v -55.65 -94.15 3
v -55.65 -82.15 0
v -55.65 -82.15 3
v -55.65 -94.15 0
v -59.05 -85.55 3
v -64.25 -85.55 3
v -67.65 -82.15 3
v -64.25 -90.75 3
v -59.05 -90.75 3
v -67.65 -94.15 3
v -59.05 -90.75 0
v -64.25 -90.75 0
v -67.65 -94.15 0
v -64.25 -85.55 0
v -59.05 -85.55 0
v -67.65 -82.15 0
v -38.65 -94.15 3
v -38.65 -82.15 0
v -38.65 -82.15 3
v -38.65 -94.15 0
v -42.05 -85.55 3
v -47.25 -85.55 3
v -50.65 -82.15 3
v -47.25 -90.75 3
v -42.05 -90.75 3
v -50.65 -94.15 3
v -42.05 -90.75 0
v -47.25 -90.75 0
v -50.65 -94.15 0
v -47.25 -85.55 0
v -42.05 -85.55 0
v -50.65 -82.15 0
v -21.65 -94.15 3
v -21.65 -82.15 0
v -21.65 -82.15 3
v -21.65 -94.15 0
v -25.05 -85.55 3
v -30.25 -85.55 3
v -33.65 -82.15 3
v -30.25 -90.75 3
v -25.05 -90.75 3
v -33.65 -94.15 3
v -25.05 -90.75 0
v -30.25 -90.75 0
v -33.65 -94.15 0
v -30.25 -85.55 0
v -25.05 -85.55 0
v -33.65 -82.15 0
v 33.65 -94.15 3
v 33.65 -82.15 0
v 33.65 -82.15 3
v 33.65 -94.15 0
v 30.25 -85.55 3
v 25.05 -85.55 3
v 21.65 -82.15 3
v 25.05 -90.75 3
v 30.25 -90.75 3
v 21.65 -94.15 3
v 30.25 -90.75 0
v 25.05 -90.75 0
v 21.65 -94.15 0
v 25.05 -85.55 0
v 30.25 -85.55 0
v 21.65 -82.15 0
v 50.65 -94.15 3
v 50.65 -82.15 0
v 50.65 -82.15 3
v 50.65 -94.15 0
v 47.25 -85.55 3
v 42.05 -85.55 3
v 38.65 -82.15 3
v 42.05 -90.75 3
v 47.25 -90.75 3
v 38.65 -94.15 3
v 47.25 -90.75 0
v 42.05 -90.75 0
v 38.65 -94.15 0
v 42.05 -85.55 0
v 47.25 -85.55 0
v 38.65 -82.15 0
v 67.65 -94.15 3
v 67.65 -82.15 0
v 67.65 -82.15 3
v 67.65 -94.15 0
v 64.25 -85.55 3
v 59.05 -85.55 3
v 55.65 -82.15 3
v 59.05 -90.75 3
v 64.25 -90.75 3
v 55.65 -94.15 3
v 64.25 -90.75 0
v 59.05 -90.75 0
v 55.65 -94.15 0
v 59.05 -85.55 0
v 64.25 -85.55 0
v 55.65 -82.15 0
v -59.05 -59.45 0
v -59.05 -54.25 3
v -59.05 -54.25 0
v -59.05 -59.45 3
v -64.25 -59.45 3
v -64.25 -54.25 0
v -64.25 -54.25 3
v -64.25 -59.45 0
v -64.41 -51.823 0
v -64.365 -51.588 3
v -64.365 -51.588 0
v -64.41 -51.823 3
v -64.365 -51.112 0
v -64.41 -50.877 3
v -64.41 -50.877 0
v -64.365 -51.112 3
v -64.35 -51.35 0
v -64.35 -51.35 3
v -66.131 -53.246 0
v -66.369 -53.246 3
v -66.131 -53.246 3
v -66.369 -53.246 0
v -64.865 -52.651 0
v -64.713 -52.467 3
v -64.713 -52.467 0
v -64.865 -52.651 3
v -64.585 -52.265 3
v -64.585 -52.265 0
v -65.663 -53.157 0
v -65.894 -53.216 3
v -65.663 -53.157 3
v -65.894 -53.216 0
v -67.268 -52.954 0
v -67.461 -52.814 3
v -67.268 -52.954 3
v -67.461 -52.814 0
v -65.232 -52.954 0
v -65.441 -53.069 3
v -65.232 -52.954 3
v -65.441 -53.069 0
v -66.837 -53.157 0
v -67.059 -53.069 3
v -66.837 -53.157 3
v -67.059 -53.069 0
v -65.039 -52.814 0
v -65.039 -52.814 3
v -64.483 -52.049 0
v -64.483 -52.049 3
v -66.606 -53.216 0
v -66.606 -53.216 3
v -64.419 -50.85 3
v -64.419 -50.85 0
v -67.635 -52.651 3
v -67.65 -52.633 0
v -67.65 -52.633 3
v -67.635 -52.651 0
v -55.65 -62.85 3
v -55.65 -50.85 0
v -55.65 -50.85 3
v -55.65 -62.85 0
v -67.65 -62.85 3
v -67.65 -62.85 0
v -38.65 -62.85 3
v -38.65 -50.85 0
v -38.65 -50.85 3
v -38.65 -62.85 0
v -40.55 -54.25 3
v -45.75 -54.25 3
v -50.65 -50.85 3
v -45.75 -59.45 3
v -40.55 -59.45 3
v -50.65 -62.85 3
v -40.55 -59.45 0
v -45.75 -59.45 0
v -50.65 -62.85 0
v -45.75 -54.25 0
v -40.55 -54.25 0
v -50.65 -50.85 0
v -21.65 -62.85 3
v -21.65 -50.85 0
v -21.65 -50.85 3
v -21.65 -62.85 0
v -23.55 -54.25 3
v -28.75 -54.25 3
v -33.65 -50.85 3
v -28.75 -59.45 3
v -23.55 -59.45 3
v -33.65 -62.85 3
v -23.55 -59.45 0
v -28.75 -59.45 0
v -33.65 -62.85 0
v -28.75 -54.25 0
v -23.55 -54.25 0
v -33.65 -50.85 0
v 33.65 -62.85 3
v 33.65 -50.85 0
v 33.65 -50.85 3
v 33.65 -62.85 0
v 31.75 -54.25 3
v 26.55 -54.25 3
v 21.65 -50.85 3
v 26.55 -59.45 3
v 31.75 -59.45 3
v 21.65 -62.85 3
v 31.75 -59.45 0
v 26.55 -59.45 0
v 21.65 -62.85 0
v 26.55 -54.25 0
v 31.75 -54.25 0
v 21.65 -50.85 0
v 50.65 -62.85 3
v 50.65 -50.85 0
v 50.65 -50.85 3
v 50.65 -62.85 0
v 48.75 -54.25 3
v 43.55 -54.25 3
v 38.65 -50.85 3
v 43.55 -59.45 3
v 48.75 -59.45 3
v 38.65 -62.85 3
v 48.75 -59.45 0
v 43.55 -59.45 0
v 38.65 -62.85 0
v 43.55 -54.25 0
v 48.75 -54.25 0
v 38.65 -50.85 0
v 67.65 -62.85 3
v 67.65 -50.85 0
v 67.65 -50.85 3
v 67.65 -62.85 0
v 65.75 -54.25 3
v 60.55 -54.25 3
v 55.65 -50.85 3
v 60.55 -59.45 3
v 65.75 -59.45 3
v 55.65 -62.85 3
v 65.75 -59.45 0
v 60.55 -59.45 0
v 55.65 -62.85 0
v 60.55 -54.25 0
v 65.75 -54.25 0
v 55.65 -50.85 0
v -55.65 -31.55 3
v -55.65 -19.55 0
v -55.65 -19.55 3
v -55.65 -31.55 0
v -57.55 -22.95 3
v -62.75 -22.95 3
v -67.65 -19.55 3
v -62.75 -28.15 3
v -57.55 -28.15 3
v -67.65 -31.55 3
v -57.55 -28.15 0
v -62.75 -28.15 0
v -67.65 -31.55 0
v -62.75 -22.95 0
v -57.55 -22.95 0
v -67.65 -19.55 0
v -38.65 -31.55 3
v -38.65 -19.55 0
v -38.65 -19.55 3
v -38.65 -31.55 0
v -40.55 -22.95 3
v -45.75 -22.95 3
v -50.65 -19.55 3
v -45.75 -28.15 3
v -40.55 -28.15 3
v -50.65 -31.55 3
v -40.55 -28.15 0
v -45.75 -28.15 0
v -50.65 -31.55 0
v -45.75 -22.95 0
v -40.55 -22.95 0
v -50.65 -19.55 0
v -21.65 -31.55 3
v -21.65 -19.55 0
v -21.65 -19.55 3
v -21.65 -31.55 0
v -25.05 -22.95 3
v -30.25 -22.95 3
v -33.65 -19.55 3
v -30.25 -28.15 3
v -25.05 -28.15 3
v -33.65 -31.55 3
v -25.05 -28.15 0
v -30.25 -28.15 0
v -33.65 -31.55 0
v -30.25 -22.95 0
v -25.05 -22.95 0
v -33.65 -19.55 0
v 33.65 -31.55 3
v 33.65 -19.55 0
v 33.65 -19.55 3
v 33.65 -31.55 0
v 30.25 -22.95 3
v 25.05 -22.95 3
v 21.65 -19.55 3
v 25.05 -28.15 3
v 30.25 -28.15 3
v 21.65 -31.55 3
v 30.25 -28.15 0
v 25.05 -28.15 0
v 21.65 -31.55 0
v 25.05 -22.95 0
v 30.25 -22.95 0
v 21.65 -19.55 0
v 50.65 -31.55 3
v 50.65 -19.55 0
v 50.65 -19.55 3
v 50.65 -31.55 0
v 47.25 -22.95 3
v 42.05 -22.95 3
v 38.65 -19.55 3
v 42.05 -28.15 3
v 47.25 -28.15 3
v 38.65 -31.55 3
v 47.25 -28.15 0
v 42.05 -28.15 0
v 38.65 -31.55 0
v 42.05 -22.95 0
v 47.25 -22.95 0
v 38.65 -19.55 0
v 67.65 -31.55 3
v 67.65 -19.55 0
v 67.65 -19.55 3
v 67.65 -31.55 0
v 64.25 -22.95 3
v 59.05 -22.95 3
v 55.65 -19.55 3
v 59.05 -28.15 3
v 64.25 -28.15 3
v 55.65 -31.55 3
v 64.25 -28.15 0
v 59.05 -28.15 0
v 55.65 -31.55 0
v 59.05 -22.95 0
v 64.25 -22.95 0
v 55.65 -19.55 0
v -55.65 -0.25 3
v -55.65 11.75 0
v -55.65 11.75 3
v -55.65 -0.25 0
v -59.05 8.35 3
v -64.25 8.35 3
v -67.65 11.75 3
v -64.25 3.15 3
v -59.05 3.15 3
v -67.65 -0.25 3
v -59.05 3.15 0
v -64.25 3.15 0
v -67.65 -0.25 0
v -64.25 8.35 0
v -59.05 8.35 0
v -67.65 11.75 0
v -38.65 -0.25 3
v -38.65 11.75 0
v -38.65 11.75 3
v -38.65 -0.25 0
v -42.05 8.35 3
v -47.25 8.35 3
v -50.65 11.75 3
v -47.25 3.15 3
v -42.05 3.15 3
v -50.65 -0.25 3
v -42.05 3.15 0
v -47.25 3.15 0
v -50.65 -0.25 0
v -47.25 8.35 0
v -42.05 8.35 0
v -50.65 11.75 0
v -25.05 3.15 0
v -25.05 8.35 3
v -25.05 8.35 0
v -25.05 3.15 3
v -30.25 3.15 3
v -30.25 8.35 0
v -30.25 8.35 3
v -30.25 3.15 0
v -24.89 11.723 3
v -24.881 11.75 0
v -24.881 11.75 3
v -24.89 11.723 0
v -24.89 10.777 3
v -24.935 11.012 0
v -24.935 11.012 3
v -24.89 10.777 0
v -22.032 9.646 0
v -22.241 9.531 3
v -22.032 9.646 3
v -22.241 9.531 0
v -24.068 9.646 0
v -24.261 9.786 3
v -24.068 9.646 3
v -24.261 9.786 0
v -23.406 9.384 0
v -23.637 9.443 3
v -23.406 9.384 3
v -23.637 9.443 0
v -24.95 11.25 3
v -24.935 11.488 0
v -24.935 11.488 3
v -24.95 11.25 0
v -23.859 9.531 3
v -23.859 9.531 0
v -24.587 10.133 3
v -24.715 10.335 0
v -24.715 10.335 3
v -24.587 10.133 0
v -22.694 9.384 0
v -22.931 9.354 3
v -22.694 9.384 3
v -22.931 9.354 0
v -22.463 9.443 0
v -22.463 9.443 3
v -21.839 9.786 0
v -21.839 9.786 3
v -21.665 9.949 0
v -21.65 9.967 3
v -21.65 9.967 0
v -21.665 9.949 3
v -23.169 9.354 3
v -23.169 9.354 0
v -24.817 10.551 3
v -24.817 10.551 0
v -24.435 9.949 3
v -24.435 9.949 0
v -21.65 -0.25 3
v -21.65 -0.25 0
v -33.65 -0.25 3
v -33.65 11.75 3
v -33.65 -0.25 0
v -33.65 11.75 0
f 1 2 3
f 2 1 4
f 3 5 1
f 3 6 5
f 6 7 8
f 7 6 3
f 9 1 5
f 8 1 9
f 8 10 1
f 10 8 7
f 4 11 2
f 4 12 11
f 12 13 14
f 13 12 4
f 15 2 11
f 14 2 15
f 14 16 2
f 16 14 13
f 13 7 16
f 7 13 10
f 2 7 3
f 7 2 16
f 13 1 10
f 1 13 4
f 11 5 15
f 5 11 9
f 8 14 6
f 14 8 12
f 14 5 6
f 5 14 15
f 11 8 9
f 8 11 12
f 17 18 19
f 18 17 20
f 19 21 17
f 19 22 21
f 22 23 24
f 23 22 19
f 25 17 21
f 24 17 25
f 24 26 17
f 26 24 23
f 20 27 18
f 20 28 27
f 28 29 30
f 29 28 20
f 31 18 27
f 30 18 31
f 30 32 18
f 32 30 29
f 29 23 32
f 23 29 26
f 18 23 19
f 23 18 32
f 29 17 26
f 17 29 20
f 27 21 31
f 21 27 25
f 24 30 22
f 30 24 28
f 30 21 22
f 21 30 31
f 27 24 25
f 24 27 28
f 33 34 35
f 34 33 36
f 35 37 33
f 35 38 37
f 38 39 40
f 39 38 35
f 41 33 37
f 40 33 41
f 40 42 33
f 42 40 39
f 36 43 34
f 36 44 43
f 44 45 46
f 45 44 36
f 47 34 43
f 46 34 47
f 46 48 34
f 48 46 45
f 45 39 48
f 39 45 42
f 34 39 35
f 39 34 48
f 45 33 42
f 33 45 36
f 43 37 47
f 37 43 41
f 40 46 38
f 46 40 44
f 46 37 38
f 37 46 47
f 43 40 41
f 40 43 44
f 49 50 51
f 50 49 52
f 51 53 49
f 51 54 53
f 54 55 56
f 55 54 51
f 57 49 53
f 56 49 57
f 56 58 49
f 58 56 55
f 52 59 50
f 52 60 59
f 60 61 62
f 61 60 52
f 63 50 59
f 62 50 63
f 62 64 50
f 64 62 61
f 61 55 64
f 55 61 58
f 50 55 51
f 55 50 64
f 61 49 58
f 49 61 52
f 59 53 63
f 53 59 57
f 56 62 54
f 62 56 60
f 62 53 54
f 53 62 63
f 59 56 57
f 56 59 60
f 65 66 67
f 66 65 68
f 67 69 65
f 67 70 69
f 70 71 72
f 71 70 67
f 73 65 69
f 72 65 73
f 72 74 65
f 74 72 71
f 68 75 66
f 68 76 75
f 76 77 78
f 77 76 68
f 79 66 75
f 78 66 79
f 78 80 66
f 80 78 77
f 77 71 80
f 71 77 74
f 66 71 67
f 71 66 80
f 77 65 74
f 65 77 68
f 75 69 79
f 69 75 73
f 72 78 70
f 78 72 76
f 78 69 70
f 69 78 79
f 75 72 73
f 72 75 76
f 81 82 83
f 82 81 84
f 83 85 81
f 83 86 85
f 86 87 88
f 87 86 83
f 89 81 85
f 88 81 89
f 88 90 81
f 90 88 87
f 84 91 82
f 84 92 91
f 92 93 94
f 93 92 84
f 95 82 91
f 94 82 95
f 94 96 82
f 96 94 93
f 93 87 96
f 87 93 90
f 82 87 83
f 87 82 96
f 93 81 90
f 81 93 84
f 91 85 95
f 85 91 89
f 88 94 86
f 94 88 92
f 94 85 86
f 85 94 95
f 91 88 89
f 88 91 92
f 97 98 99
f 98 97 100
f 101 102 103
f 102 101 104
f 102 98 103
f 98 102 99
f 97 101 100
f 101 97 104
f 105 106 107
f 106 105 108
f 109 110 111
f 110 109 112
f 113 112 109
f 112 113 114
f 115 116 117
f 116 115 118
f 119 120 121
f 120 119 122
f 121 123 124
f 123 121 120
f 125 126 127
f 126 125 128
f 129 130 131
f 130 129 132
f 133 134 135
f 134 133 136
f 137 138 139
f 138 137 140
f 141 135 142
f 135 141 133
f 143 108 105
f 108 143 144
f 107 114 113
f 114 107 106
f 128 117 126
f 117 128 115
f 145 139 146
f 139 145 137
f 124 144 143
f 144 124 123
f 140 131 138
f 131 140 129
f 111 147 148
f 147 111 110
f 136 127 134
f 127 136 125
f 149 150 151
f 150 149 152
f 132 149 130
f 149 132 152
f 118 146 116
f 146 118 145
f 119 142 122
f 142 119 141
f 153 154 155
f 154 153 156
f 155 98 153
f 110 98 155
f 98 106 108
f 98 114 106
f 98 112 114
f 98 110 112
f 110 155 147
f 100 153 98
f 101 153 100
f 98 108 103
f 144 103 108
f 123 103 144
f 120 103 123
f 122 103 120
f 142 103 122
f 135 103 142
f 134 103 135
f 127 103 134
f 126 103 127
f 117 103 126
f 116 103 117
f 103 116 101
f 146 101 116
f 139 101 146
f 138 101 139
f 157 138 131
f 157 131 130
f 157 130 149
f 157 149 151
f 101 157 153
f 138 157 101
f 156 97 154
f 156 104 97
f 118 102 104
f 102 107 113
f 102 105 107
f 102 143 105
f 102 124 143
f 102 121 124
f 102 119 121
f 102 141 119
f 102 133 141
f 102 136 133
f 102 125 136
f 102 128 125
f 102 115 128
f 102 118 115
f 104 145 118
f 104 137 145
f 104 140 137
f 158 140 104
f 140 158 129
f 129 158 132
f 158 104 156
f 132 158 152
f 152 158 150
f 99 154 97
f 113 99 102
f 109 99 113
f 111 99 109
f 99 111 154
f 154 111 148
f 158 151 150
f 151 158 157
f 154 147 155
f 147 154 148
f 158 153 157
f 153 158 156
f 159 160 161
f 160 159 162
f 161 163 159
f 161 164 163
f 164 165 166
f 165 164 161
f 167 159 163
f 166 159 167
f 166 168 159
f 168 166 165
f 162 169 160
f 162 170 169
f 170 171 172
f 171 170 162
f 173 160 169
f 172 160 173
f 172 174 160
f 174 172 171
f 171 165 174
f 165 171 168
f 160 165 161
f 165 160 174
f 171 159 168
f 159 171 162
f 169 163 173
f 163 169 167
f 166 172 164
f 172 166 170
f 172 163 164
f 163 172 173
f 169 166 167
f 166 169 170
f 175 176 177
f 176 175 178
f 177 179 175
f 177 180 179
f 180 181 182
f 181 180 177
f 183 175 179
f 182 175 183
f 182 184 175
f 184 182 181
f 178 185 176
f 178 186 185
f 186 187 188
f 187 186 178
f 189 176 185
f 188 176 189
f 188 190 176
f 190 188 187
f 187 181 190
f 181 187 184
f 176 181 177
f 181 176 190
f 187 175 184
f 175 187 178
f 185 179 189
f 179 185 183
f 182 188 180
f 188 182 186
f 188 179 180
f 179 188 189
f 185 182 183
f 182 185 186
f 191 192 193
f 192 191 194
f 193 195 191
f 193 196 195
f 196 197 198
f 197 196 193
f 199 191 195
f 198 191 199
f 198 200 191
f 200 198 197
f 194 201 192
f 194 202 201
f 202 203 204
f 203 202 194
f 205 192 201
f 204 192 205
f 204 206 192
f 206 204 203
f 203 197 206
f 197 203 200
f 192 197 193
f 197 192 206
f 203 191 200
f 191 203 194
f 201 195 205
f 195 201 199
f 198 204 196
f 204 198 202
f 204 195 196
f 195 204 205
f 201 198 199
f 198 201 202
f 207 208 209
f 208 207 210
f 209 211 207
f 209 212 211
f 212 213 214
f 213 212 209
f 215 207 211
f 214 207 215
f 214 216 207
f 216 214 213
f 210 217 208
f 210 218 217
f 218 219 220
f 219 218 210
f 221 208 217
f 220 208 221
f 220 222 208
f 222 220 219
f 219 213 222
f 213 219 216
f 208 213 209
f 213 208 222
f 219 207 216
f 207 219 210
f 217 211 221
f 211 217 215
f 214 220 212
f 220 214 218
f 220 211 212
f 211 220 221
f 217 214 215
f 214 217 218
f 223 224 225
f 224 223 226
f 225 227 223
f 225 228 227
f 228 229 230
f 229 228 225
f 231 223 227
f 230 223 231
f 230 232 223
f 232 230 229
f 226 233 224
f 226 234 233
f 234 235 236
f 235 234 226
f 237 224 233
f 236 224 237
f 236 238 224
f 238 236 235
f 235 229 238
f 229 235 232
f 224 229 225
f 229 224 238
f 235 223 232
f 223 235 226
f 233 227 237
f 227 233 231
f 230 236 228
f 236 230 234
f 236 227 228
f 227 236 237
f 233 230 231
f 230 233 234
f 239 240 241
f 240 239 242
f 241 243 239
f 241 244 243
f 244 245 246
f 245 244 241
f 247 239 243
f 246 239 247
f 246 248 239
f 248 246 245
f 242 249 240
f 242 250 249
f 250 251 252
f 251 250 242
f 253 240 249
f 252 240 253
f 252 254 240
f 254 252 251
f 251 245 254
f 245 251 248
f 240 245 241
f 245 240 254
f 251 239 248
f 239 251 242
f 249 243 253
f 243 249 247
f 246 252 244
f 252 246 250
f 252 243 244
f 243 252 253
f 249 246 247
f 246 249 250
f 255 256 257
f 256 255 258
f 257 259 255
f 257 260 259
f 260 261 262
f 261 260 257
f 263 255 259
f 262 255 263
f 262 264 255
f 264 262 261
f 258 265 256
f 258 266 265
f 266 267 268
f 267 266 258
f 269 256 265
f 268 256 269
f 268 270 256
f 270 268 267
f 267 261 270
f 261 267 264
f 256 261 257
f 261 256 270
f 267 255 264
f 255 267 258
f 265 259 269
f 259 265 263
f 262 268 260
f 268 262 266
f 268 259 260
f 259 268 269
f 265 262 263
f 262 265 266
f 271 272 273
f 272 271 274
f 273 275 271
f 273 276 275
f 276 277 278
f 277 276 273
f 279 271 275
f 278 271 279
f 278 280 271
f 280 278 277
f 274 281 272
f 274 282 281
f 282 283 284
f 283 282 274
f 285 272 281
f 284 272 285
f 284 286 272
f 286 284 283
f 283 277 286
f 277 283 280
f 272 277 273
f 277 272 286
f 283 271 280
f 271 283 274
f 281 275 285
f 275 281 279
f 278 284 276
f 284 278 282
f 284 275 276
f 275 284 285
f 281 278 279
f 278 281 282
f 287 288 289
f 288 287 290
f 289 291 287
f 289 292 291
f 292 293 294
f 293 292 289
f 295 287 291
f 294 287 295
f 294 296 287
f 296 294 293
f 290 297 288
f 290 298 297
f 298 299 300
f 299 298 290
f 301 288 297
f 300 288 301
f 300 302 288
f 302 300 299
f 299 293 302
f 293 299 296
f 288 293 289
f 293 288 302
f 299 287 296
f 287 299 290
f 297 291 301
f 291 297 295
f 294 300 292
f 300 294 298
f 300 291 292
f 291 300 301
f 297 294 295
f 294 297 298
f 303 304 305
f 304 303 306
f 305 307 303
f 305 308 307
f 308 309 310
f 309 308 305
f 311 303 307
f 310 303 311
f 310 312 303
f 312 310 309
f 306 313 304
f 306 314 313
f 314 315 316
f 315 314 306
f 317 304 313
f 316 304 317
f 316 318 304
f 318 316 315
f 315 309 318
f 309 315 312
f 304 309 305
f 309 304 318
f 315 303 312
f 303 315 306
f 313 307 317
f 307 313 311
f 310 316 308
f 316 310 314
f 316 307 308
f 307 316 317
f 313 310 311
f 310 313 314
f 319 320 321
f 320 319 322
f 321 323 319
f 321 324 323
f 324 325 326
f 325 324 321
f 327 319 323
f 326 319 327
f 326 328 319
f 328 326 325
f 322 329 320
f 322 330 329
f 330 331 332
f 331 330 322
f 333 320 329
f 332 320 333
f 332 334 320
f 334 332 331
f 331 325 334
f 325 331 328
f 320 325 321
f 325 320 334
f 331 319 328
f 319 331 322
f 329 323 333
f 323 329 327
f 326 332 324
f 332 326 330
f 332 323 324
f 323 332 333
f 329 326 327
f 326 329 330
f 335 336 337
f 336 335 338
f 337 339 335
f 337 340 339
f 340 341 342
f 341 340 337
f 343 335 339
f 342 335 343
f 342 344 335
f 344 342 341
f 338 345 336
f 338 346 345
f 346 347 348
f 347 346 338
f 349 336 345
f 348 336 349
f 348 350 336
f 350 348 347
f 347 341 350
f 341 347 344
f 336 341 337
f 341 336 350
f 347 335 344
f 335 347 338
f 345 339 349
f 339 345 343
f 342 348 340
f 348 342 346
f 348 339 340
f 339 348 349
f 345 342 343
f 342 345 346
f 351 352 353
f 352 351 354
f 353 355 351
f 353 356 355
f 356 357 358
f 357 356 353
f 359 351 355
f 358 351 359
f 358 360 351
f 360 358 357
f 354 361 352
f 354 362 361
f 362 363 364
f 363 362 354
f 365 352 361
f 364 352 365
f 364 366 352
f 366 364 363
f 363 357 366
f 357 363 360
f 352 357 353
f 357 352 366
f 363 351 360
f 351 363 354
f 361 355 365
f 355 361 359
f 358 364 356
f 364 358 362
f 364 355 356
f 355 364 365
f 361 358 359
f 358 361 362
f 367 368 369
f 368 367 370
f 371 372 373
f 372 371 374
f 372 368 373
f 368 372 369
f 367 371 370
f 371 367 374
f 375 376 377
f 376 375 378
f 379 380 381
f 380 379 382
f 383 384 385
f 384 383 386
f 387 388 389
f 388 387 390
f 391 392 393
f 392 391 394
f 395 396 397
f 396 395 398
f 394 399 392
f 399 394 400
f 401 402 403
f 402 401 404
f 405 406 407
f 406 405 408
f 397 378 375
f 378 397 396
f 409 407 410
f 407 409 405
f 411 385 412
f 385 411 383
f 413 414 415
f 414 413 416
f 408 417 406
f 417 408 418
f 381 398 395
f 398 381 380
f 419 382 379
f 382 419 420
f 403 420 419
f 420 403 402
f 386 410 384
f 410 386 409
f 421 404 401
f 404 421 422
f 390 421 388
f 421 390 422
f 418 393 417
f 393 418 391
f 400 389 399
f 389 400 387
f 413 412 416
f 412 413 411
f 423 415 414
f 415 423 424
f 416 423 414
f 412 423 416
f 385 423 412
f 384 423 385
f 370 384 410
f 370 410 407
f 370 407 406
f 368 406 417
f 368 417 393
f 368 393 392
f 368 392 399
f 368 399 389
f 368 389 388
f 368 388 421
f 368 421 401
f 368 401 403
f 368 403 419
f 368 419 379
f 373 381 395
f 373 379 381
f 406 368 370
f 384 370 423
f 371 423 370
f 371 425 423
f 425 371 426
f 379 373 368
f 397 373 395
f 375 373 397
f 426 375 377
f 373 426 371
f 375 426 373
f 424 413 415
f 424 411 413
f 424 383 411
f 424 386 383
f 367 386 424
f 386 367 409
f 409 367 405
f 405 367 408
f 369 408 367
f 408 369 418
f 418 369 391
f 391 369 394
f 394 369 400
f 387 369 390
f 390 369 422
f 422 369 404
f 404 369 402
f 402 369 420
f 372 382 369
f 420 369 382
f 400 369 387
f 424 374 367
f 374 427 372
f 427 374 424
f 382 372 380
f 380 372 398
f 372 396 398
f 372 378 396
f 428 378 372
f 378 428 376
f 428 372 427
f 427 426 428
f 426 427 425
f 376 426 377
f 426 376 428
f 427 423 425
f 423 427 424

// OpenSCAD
$fn = 50;

difference() {
	union() {
		translate(v = [-61.6500000005, -88.15, 0]) {
			rotate(a = [0, 0, 0]) {
				difference() {
					union() {
						translate(v = [-6.0, -6.0, 0]) {
							cube(size = [12.0, 12.0, 3.0]);
						}
					}
					union() {
						translate(v = [-2.6, -2.6, -0.1]) {
							cube(size = [5.2, 5.2, 3.2]);
						}
					}
				}
			}
		}
		translate(v = [-44.6500000005, -88.15, 0]) {
			rotate(a = [0, 0, 0]) {
				difference() {
					union() {
						translate(v = [-6.0, -6.0, 0]) {
							cube(size = [12.0, 12.0, 3.0]);
						}
					}
					union() {
						translate(v = [-2.6, -2.6, -0.1]) {
							cube(size = [5.2, 5.2, 3.2]);
						}
					}
				}
			}
		}
		translate(v = [-27.6500000005, -88.15, 0]) {
			rotate(a = [0, 0, 0]) {
				difference() {
					union() {
						translate(v = [-6.0, -6.0, 0]) {
							cube(size = [12.0, 12.0, 3.0]);
						}
					}
					union() {
						translate(v = [-2.6, -2.6, -0.1]) {
							cube(size = [5.2, 5.2, 3.2]);
						}
					}
				}
			}
		}
		translate(v = [27.649999999499997, -88.15, 0]) {
			rotate(a = [0, 0, 0]) {
				difference() {
					union() {
						translate(v = [-6.0, -6.0, 0]) {
							cube(size = [12.0, 12.0, 3.0]);
						}
					}
					union() {
						translate(v = [-2.6, -2.6, -0.1]) {
							cube(size = [5.2, 5.2, 3.2]);
						}
					}
				}
			}
		}
		translate(v = [44.6499999995, -88.15, 0]) {
			rotate(a = [0, 0, 0]) {
				difference() {
					union() {
						translate(v = [-6.0, -6.0, 0]) {
							cube(size = [12.0, 12.0, 3.0]);
						}
					}
					union() {
						translate(v = [-2.6, -2.6, -0.1]) {
							cube(size = [5.2, 5.2, 3.2]);
						}
					}
				}
			}
		}
		translate(v = [61.6499999995, -88.15, 0]) {
			rotate(a = [0, 0, 0]) {
				difference() {
					union() {
						translate(v = [-6.0, -6.0, 0]) {
							cube(size = [12.0, 12.0, 3.0]);
						}
					}
					union() {
						translate(v = [-2.6, -2.6, -0.1]) {
							cube(size = [5.2, 5.2, 3.2]);
						}
					}
				}
			}
		}
		translate(v = [-61.6500000005, -56.85000000000001, 0]) {
			rotate(a = [0, 0, 0]) {
				difference() {
					union() {
						translate(v = [-6.0, -6.0, 0]) {
							cube(size = [12.0, 12.0, 3.0]);
						}
					}
					union() {
						translate(v = [-2.6, -2.6, -0.1]) {
							cube(size = [5.2, 5.2, 3.2]);
						}
						translate(v = [-4.6, 5.5, -0.1]) {
							cylinder(h = 3.2, r = 1.9000000000000001);
						}
					}
				}
			}
		}
		translate(v = [-44.6500000005, -56.85000000000001, 0]) {
			rotate(a = [0, 0, 0]) {
				difference() {
					union() {
						translate(v = [-6.0, -6.0, 0]) {
							cube(size = [12.0, 12.0, 3.0]);
						}
					}
					union() {
						translate(v = [-1.1, -2.6, -0.1]) {
							cube(size = [5.2, 5.2, 3.2]);
						}
					}
				}
			}
		}
		translate(v = [-27.6500000005, -56.85000000000001, 0]) {
			rotate(a = [0, 0, 0]) {
				difference() {
					union() {
						translate(v = [-6.0, -6.0, 0]) {
							cube(size = [12.0, 12.0, 3.0]);
						}
					}
					union() {
						translate(v = [-1.1, -2.6, -0.1]) {
							cube(size = [5.2, 5.2, 3.2]);
						}
					}
				}
			}
		}
		translate(v = [27.649999999499997, -56.85000000000001, 0]) {
			rotate(a = [0, 0, 0]) {
				difference() {
					union() {
						translate(v = [-6.0, -6.0, 0]) {
							cube(size = [12.0, 12.0, 3.0]);
						}
					}
					union() {
						translate(v = [-1.1, -2.6, -0.1]) {
							cube(size = [5.2, 5.2, 3.2]);
						}
					}
				}
			}
		}
		translate(v = [44.6499999995, -56.85000000000001, 0]) {
			rotate(a = [0, 0, 0]) {
				difference() {
					union() {
						translate(v = [-6.0, -6.0, 0]) {
							cube(size = [12.0, 12.0, 3.0]);
						}
					}
					union() {
						translate(v = [-1.1, -2.6, -0.1]) {
							cube(size = [5.2, 5.2, 3.2]);
						}
					}
				}
			}
		}
		translate(v = [61.6499999995, -56.85000000000001, 0]) {
			rotate(a = [0, 0, 0]) {
				difference() {
					union() {
						translate(v = [-6.0, -6.0, 0]) {
							cube(size = [12.0, 12.0, 3.0]);
						}
					}
					union() {
						translate(v = [-1.1, -2.6, -0.1]) {
							cube(size = [5.2, 5.2, 3.2]);
						}
					}
				}
			}
		}
		translate(v = [-61.6500000005, -25.550000000000004, 0]) {
			rotate(a = [0, 0, 0]) {
				difference() {
					union() {
						translate(v = [-6.0, -6.0, 0]) {
							cube(size = [12.0, 12.0, 3.0]);
						}
					}
					union() {
						translate(v = [-1.1, -2.6, -0.1]) {
							cube(size = [5.2, 5.2, 3.2]);
						}
					}
				}
			}
		}
		translate(v = [-44.6500000005, -25.550000000000004, 0]) {
			rotate(a = [0, 0, 0]) {
				difference() {
					union() {
						translate(v = [-6.0, -6.0, 0]) {
							cube(size = [12.0, 12.0, 3.0]);
						}
					}
					union() {
						translate(v = [-1.1, -2.6, -0.1]) {
							cube(size = [5.2, 5.2, 3.2]);
						}
					}
				}
			}
		}
		translate(v = [-27.6500000005, -25.550000000000004, 0]) {
			rotate(a = [0, 0, 0]) {
				difference() {
					union() {
						translate(v = [-6.0, -6.0, 0]) {
							cube(size = [12.0, 12.0, 3.0]);
						}
					}
					union() {
						translate(v = [-2.6, -2.6, -0.1]) {
							cube(size = [5.2, 5.2, 3.2]);
						}
					}
				}
			}
		}
		translate(v = [27.649999999499997, -25.550000000000004, 0]) {
			rotate(a = [0, 0, 0]) {
				difference() {
					union() {
						translate(v = [-6.0, -6.0, 0]) {
							cube(size = [12.0, 12.0, 3.0]);
						}
					}
					union() {
						translate(v = [-2.6, -2.6, -0.1]) {
							cube(size = [5.2, 5.2, 3.2]);
						}
					}
				}
			}
		}
		translate(v = [44.6499999995, -25.550000000000004, 0]) {
			rotate(a = [0, 0, 0]) {
				difference() {
					union() {
						translate(v = [-6.0, -6.0, 0]) {
							cube(size = [12.0, 12.0, 3.0]);
						}
					}
					union() {
						translate(v = [-2.6, -2.6, -0.1]) {
							cube(size = [5.2, 5.2, 3.2]);
						}
					}
				}
			}
		}
		translate(v = [61.6499999995, -25.550000000000004, 0]) {
			rotate(a = [0, 0, 0]) {
				difference() {
					union() {
						translate(v = [-6.0, -6.0, 0]) {
							cube(size = [12.0, 12.0, 3.0]);
						}
					}
					union() {
						translate(v = [-2.6, -2.6, -0.1]) {
							cube(size = [5.2, 5.2, 3.2]);
						}
					}
				}
			}
		}
		translate(v = [-61.6500000005, 5.75, 0]) {
			rotate(a = [0, 0, 0]) {
				difference() {
					union() {
						translate(v = [-6.0, -6.0, 0]) {
							cube(size = [12.0, 12.0, 3.0]);
						}
					}
					union() {
						translate(v = [-2.6, -2.6, -0.1]) {
							cube(size = [5.2, 5.2, 3.2]);
						}
					}
				}
			}
		}
		translate(v = [-44.6500000005, 5.75, 0]) {
			rotate(a = [0, 0, 0]) {
				difference() {
					union() {
						translate(v = [-6.0, -6.0, 0]) {
							cube(size = [12.0, 12.0, 3.0]);
						}
					}
					union() {
						translate(v = [-2.6, -2.6, -0.1]) {
							cube(size = [5.2, 5.2, 3.2]);
						}
					}
				}
			}
		}
		translate(v = [-27.6500000005, 5.75, 0]) {
			rotate(a = [0, 0, 0]) {
				difference() {
					union() {
						translate(v = [-6.0, -6.0, 0]) {
							cube(size = [12.0, 12.0, 3.0]);
						}
					}
					union() {
						translate(v = [-2.6, -2.6, -0.1]) {
							cube(size = [5.2, 5.2, 3.2]);
						}
						translate(v = [4.6, 5.5, -0.1]) {
							cylinder(h = 3.2, r = 1.9000000000000001);
						}
					}
				}
			}
		}
	}
	union();
}
